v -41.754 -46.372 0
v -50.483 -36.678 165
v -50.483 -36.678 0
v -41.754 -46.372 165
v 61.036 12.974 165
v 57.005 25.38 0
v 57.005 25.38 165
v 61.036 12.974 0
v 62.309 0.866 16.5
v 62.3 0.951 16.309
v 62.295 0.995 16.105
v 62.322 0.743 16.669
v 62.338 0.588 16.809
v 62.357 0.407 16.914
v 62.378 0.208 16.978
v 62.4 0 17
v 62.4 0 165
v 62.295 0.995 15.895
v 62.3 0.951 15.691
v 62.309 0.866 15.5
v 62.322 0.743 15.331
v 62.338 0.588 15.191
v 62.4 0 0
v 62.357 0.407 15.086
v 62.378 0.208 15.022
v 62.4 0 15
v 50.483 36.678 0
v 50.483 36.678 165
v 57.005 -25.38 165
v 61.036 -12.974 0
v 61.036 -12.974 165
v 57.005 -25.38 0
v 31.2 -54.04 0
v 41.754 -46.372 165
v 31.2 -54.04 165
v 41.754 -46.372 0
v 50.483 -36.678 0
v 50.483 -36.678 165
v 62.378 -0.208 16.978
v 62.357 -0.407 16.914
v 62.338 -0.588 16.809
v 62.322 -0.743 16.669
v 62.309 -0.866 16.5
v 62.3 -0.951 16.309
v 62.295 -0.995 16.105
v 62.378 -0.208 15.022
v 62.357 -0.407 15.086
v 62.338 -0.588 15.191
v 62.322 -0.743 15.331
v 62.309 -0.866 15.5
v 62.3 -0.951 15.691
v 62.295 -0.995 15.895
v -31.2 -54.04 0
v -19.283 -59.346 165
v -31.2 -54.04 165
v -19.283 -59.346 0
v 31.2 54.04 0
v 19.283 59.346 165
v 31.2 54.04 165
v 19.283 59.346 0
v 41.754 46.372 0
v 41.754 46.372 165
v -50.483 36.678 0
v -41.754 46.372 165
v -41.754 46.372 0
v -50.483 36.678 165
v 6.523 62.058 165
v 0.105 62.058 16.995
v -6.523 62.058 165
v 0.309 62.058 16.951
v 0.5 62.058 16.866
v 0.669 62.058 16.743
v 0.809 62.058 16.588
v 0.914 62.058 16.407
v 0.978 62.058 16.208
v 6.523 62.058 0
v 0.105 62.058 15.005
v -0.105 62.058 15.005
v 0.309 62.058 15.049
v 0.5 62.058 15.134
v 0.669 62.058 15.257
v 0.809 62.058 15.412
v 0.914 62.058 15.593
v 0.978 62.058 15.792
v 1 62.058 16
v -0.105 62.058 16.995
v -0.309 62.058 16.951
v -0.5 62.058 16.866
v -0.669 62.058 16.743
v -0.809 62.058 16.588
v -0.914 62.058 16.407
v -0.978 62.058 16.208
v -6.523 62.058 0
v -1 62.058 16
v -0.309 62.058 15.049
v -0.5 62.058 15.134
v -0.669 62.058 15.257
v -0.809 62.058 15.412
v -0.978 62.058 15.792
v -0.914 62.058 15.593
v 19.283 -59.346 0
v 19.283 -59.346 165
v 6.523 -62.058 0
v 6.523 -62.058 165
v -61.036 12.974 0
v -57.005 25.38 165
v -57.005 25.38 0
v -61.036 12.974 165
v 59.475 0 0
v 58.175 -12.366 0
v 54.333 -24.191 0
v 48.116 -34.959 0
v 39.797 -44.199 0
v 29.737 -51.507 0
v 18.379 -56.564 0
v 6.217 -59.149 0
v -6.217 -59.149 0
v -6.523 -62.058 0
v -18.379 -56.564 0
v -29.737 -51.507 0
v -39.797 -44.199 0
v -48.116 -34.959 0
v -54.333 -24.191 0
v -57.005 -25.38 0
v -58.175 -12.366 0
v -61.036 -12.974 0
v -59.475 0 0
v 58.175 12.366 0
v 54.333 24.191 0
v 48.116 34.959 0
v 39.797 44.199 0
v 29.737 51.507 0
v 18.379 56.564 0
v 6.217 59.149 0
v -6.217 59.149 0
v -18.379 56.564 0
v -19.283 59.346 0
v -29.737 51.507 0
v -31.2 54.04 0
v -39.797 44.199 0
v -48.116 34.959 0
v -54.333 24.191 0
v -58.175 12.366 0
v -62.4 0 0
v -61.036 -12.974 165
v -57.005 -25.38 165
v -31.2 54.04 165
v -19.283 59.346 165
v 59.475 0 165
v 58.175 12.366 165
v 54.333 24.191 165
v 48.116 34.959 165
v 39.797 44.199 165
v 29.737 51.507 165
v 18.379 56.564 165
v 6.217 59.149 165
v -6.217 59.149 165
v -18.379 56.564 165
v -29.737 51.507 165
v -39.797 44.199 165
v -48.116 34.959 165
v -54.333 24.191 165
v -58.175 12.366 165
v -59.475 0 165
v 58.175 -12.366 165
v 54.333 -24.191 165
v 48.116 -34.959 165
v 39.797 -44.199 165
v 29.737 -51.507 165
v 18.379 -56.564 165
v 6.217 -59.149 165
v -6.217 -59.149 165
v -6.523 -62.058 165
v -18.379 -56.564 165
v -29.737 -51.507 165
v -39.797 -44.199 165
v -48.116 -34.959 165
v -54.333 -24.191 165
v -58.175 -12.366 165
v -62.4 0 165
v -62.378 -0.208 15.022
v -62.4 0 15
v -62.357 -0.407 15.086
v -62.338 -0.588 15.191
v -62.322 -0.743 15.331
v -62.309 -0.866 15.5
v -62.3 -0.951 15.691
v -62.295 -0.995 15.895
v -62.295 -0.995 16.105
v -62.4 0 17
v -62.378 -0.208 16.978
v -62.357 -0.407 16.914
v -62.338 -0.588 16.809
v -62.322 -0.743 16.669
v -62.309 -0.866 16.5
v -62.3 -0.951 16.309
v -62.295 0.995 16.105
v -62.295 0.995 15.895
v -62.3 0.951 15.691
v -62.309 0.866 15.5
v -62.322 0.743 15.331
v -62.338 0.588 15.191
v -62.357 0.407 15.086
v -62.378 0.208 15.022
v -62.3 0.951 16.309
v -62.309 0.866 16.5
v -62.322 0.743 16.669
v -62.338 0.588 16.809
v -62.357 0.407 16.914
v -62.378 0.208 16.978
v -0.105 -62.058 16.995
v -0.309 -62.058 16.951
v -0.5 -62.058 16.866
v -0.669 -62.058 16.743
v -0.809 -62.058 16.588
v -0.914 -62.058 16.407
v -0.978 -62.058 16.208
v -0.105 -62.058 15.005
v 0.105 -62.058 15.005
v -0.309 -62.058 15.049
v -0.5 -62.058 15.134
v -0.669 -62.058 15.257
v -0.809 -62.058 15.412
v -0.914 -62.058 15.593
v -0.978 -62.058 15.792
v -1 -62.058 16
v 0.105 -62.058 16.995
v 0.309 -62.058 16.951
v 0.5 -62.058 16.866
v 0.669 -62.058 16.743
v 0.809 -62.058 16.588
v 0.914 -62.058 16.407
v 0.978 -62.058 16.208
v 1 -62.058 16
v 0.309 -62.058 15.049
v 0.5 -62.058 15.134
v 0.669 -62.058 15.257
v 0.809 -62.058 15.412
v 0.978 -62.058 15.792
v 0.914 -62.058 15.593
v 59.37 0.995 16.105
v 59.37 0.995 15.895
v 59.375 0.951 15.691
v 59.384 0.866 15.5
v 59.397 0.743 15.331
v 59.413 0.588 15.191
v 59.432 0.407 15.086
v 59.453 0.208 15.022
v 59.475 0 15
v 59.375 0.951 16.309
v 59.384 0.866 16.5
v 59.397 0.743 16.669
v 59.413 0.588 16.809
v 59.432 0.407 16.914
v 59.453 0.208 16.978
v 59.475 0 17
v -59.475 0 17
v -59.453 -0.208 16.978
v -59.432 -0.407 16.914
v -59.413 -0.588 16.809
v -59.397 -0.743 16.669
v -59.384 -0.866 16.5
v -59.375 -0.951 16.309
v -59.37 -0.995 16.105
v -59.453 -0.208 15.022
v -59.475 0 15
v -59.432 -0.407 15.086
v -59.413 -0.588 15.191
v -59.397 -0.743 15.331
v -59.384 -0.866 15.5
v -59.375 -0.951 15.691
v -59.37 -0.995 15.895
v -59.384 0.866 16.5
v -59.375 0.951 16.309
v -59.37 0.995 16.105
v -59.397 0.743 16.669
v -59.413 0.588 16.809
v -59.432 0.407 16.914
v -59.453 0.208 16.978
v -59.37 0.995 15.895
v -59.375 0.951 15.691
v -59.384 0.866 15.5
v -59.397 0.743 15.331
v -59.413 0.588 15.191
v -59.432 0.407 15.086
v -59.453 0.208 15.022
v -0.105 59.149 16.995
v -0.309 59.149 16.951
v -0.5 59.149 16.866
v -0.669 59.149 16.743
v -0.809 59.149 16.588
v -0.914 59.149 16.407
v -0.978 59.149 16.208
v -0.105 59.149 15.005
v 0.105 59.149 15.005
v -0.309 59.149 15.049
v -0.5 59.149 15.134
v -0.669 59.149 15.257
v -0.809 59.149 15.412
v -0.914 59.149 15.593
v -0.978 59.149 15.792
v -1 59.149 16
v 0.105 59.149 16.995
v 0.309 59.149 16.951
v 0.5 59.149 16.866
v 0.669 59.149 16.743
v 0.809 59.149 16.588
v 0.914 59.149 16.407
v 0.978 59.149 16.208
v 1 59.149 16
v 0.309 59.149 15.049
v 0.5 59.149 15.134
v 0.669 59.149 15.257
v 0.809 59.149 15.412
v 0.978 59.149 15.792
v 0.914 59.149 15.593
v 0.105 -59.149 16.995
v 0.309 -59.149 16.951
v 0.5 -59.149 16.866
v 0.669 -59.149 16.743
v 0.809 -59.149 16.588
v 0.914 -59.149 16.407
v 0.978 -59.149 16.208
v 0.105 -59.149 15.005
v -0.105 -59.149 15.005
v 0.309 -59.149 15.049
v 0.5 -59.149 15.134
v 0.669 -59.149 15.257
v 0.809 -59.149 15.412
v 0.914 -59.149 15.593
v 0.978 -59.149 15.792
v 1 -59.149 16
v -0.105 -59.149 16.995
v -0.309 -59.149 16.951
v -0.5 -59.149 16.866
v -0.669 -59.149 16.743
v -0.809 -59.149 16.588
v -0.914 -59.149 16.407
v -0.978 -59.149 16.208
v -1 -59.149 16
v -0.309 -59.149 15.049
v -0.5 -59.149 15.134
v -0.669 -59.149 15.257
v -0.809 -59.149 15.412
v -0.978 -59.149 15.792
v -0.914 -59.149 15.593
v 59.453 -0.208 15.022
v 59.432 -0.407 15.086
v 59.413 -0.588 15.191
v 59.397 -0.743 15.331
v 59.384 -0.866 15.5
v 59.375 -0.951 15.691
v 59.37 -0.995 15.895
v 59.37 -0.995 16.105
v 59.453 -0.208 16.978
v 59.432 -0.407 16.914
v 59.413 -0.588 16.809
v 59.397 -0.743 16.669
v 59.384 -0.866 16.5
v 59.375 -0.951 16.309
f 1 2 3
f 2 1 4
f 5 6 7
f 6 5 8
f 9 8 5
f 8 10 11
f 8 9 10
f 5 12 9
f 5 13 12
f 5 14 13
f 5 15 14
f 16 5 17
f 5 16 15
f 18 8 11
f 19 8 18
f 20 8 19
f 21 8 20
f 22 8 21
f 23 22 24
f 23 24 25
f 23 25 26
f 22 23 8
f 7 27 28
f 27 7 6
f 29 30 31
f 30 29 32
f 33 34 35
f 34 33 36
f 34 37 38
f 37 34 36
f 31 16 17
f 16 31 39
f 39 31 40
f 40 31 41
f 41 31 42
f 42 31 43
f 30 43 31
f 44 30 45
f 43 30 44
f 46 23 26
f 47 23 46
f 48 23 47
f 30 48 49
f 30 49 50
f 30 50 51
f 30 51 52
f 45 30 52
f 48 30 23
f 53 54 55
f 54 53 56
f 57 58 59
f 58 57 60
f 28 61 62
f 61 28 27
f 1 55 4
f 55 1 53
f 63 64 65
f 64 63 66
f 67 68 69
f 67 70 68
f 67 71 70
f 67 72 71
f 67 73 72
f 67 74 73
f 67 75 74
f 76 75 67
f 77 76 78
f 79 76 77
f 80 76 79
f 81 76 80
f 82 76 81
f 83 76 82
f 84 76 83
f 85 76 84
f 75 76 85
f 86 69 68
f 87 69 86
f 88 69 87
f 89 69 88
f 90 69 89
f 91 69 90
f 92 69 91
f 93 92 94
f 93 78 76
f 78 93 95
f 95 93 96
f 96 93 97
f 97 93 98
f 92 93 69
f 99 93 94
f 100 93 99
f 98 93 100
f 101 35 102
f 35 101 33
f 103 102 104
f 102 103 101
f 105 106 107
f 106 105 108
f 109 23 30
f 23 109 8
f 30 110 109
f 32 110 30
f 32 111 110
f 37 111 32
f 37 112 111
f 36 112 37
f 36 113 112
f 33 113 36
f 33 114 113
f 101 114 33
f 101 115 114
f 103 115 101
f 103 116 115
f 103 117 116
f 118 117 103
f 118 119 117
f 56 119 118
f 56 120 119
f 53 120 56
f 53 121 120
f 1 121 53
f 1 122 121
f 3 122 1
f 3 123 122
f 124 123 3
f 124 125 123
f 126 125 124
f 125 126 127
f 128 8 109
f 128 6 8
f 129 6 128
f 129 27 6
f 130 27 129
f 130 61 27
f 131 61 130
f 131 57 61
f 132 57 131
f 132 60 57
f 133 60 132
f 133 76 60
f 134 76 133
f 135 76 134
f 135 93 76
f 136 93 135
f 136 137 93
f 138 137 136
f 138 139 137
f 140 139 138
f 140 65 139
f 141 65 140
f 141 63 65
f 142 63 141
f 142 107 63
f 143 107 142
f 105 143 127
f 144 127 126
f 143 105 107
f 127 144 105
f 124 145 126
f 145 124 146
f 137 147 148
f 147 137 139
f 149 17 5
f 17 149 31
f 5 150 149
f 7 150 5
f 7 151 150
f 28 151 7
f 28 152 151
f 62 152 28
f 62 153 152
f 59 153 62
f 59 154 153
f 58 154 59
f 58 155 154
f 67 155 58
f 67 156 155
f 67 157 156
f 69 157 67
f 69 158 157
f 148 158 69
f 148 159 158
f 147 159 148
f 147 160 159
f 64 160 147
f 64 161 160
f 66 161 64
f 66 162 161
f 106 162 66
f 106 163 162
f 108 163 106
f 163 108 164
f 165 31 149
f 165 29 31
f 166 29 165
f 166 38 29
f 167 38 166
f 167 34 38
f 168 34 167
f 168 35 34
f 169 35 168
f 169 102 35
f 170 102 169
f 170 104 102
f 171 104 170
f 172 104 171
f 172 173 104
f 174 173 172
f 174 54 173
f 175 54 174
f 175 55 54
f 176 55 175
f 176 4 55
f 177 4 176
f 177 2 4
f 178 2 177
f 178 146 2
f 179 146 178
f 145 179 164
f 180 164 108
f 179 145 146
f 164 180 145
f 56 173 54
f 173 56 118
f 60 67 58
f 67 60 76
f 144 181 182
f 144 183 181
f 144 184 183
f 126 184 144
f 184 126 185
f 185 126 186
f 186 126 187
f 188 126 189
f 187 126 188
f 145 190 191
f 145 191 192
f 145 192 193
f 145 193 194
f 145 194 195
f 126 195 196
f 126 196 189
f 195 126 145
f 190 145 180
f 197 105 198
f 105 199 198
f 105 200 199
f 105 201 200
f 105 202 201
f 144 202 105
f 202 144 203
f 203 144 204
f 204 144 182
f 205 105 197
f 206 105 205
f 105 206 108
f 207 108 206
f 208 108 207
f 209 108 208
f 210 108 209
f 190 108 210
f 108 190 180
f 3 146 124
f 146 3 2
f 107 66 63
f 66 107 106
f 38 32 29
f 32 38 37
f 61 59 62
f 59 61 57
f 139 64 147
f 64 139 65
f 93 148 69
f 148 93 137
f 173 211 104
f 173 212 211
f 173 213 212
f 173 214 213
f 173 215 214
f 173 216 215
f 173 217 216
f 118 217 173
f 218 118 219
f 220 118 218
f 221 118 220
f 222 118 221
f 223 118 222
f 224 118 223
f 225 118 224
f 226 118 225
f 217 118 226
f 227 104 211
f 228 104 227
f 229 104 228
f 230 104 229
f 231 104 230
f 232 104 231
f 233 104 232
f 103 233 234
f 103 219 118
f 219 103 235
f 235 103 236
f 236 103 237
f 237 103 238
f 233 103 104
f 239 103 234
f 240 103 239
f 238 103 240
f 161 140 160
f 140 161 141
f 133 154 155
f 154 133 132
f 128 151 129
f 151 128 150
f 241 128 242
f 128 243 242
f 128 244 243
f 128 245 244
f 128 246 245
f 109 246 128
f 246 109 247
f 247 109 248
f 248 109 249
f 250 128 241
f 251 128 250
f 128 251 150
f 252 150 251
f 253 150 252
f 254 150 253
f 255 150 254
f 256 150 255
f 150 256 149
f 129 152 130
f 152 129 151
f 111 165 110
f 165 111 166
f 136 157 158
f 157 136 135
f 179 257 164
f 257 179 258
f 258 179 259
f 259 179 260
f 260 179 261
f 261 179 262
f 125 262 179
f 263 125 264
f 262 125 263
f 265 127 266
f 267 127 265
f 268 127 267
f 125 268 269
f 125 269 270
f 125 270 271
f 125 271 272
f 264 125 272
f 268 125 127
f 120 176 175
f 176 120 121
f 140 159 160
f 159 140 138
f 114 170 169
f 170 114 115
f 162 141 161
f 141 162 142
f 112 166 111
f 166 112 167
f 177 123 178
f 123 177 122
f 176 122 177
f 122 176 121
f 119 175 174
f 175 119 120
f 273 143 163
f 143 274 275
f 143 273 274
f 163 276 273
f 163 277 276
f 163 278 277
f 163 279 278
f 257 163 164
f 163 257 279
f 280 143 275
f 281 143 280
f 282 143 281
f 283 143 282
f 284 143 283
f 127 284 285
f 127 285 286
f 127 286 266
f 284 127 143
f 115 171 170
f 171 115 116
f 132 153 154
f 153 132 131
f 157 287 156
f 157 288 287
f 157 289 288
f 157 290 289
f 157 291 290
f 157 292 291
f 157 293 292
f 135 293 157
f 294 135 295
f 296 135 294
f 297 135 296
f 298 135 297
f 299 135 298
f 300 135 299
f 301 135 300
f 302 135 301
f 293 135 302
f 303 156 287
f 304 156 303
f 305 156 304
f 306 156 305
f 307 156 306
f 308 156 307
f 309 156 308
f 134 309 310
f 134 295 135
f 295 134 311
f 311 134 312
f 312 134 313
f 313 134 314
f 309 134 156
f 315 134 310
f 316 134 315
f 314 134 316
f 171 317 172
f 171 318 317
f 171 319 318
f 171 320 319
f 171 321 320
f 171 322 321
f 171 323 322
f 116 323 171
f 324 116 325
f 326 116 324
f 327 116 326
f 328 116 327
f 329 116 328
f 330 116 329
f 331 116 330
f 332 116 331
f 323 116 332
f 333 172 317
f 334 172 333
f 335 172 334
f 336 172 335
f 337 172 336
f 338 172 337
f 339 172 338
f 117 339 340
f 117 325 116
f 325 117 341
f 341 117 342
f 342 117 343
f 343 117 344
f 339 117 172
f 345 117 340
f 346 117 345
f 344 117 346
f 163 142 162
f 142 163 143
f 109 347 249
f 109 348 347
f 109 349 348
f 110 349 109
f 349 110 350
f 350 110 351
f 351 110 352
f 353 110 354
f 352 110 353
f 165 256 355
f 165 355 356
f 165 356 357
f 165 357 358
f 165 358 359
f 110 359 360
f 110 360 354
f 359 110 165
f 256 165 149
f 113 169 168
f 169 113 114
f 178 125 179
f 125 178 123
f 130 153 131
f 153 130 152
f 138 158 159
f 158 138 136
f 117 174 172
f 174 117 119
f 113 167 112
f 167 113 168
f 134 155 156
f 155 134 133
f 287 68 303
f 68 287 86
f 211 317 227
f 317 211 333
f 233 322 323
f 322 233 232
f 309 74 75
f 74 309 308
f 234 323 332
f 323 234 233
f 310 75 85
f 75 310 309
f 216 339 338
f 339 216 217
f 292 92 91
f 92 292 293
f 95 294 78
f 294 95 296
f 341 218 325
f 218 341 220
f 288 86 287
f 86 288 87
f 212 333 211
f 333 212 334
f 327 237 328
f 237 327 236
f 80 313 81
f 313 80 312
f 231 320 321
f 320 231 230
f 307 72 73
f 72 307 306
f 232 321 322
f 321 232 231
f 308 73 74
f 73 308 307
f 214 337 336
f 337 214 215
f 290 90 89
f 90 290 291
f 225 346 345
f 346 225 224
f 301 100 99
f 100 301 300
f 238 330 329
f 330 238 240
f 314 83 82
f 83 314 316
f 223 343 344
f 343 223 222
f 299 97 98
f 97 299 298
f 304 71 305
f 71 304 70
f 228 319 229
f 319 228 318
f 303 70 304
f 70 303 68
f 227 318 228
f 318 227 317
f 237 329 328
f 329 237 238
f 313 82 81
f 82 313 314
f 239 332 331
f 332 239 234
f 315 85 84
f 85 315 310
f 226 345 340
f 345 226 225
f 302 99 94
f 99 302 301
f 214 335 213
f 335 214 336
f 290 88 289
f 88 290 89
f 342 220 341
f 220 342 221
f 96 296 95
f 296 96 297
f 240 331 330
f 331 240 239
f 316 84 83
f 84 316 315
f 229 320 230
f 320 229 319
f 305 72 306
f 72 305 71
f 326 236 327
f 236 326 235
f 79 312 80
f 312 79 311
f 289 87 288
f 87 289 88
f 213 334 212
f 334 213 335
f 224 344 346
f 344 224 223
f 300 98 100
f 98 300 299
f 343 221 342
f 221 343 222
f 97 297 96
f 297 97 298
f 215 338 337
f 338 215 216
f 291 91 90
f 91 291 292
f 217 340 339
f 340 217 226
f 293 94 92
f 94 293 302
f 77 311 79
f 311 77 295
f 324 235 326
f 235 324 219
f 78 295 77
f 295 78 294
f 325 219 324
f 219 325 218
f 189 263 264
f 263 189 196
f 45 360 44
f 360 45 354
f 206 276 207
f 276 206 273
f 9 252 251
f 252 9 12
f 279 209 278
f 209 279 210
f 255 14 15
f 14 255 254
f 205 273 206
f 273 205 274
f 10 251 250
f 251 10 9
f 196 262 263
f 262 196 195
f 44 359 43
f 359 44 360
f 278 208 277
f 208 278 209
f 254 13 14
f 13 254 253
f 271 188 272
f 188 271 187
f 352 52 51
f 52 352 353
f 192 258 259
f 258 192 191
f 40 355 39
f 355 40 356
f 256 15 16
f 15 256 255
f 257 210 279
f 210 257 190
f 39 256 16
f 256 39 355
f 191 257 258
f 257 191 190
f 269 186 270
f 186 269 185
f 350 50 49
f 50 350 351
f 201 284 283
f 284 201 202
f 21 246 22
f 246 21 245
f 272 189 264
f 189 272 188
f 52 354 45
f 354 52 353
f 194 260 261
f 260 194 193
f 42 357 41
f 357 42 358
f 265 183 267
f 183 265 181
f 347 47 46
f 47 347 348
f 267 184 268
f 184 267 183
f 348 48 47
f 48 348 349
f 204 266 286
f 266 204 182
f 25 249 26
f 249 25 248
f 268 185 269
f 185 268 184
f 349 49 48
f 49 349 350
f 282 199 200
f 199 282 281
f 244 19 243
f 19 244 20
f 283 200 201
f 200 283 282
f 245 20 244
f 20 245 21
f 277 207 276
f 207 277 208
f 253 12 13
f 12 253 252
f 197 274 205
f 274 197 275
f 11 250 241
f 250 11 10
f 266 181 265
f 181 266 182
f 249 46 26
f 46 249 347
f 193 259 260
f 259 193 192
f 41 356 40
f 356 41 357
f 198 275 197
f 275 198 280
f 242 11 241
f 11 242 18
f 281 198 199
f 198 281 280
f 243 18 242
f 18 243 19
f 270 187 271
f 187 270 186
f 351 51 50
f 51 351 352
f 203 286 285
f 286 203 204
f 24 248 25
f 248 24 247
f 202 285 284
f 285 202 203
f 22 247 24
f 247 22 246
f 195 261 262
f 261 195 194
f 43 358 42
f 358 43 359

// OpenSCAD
/*
Connecting 125mm Pipe Hack
for Weather Station

Created October 13, 2023
Modified December 13, 2023
*/

// see https://epco-plastics.com/news/post/inch-and-metric-pipe-dimensions

pvc_125_id = 118.8;
pvc_125_od = 125; // OD of metric pipe
nozzle_size = 0.6;

ht = 165;  // OG 150 + 15 = 165 12/13/2023 (then won't need length fix)

id = pvc_125_id + 0.15;
od =  pvc_125_id + floor((pvc_125_od - pvc_125_id) / nozzle_size) * nozzle_size; // make wall size nultiple of nozzle size (0.6)
echo("OD", od);

hole_d = 2;
hole_z_off = 5 + 11;

$fs = 0.2;

difference() {
    cylinder(d=od, h=ht);
    cylinder(d=id, h=ht);

    translate([0, od/2, hole_z_off])
    rotate([90, 0, 0])
    cylinder(d=hole_d, h=od);

    translate([od/2, 0, hole_z_off])
    rotate([0, 270, 0])
    cylinder(d=hole_d, h=od);
}
